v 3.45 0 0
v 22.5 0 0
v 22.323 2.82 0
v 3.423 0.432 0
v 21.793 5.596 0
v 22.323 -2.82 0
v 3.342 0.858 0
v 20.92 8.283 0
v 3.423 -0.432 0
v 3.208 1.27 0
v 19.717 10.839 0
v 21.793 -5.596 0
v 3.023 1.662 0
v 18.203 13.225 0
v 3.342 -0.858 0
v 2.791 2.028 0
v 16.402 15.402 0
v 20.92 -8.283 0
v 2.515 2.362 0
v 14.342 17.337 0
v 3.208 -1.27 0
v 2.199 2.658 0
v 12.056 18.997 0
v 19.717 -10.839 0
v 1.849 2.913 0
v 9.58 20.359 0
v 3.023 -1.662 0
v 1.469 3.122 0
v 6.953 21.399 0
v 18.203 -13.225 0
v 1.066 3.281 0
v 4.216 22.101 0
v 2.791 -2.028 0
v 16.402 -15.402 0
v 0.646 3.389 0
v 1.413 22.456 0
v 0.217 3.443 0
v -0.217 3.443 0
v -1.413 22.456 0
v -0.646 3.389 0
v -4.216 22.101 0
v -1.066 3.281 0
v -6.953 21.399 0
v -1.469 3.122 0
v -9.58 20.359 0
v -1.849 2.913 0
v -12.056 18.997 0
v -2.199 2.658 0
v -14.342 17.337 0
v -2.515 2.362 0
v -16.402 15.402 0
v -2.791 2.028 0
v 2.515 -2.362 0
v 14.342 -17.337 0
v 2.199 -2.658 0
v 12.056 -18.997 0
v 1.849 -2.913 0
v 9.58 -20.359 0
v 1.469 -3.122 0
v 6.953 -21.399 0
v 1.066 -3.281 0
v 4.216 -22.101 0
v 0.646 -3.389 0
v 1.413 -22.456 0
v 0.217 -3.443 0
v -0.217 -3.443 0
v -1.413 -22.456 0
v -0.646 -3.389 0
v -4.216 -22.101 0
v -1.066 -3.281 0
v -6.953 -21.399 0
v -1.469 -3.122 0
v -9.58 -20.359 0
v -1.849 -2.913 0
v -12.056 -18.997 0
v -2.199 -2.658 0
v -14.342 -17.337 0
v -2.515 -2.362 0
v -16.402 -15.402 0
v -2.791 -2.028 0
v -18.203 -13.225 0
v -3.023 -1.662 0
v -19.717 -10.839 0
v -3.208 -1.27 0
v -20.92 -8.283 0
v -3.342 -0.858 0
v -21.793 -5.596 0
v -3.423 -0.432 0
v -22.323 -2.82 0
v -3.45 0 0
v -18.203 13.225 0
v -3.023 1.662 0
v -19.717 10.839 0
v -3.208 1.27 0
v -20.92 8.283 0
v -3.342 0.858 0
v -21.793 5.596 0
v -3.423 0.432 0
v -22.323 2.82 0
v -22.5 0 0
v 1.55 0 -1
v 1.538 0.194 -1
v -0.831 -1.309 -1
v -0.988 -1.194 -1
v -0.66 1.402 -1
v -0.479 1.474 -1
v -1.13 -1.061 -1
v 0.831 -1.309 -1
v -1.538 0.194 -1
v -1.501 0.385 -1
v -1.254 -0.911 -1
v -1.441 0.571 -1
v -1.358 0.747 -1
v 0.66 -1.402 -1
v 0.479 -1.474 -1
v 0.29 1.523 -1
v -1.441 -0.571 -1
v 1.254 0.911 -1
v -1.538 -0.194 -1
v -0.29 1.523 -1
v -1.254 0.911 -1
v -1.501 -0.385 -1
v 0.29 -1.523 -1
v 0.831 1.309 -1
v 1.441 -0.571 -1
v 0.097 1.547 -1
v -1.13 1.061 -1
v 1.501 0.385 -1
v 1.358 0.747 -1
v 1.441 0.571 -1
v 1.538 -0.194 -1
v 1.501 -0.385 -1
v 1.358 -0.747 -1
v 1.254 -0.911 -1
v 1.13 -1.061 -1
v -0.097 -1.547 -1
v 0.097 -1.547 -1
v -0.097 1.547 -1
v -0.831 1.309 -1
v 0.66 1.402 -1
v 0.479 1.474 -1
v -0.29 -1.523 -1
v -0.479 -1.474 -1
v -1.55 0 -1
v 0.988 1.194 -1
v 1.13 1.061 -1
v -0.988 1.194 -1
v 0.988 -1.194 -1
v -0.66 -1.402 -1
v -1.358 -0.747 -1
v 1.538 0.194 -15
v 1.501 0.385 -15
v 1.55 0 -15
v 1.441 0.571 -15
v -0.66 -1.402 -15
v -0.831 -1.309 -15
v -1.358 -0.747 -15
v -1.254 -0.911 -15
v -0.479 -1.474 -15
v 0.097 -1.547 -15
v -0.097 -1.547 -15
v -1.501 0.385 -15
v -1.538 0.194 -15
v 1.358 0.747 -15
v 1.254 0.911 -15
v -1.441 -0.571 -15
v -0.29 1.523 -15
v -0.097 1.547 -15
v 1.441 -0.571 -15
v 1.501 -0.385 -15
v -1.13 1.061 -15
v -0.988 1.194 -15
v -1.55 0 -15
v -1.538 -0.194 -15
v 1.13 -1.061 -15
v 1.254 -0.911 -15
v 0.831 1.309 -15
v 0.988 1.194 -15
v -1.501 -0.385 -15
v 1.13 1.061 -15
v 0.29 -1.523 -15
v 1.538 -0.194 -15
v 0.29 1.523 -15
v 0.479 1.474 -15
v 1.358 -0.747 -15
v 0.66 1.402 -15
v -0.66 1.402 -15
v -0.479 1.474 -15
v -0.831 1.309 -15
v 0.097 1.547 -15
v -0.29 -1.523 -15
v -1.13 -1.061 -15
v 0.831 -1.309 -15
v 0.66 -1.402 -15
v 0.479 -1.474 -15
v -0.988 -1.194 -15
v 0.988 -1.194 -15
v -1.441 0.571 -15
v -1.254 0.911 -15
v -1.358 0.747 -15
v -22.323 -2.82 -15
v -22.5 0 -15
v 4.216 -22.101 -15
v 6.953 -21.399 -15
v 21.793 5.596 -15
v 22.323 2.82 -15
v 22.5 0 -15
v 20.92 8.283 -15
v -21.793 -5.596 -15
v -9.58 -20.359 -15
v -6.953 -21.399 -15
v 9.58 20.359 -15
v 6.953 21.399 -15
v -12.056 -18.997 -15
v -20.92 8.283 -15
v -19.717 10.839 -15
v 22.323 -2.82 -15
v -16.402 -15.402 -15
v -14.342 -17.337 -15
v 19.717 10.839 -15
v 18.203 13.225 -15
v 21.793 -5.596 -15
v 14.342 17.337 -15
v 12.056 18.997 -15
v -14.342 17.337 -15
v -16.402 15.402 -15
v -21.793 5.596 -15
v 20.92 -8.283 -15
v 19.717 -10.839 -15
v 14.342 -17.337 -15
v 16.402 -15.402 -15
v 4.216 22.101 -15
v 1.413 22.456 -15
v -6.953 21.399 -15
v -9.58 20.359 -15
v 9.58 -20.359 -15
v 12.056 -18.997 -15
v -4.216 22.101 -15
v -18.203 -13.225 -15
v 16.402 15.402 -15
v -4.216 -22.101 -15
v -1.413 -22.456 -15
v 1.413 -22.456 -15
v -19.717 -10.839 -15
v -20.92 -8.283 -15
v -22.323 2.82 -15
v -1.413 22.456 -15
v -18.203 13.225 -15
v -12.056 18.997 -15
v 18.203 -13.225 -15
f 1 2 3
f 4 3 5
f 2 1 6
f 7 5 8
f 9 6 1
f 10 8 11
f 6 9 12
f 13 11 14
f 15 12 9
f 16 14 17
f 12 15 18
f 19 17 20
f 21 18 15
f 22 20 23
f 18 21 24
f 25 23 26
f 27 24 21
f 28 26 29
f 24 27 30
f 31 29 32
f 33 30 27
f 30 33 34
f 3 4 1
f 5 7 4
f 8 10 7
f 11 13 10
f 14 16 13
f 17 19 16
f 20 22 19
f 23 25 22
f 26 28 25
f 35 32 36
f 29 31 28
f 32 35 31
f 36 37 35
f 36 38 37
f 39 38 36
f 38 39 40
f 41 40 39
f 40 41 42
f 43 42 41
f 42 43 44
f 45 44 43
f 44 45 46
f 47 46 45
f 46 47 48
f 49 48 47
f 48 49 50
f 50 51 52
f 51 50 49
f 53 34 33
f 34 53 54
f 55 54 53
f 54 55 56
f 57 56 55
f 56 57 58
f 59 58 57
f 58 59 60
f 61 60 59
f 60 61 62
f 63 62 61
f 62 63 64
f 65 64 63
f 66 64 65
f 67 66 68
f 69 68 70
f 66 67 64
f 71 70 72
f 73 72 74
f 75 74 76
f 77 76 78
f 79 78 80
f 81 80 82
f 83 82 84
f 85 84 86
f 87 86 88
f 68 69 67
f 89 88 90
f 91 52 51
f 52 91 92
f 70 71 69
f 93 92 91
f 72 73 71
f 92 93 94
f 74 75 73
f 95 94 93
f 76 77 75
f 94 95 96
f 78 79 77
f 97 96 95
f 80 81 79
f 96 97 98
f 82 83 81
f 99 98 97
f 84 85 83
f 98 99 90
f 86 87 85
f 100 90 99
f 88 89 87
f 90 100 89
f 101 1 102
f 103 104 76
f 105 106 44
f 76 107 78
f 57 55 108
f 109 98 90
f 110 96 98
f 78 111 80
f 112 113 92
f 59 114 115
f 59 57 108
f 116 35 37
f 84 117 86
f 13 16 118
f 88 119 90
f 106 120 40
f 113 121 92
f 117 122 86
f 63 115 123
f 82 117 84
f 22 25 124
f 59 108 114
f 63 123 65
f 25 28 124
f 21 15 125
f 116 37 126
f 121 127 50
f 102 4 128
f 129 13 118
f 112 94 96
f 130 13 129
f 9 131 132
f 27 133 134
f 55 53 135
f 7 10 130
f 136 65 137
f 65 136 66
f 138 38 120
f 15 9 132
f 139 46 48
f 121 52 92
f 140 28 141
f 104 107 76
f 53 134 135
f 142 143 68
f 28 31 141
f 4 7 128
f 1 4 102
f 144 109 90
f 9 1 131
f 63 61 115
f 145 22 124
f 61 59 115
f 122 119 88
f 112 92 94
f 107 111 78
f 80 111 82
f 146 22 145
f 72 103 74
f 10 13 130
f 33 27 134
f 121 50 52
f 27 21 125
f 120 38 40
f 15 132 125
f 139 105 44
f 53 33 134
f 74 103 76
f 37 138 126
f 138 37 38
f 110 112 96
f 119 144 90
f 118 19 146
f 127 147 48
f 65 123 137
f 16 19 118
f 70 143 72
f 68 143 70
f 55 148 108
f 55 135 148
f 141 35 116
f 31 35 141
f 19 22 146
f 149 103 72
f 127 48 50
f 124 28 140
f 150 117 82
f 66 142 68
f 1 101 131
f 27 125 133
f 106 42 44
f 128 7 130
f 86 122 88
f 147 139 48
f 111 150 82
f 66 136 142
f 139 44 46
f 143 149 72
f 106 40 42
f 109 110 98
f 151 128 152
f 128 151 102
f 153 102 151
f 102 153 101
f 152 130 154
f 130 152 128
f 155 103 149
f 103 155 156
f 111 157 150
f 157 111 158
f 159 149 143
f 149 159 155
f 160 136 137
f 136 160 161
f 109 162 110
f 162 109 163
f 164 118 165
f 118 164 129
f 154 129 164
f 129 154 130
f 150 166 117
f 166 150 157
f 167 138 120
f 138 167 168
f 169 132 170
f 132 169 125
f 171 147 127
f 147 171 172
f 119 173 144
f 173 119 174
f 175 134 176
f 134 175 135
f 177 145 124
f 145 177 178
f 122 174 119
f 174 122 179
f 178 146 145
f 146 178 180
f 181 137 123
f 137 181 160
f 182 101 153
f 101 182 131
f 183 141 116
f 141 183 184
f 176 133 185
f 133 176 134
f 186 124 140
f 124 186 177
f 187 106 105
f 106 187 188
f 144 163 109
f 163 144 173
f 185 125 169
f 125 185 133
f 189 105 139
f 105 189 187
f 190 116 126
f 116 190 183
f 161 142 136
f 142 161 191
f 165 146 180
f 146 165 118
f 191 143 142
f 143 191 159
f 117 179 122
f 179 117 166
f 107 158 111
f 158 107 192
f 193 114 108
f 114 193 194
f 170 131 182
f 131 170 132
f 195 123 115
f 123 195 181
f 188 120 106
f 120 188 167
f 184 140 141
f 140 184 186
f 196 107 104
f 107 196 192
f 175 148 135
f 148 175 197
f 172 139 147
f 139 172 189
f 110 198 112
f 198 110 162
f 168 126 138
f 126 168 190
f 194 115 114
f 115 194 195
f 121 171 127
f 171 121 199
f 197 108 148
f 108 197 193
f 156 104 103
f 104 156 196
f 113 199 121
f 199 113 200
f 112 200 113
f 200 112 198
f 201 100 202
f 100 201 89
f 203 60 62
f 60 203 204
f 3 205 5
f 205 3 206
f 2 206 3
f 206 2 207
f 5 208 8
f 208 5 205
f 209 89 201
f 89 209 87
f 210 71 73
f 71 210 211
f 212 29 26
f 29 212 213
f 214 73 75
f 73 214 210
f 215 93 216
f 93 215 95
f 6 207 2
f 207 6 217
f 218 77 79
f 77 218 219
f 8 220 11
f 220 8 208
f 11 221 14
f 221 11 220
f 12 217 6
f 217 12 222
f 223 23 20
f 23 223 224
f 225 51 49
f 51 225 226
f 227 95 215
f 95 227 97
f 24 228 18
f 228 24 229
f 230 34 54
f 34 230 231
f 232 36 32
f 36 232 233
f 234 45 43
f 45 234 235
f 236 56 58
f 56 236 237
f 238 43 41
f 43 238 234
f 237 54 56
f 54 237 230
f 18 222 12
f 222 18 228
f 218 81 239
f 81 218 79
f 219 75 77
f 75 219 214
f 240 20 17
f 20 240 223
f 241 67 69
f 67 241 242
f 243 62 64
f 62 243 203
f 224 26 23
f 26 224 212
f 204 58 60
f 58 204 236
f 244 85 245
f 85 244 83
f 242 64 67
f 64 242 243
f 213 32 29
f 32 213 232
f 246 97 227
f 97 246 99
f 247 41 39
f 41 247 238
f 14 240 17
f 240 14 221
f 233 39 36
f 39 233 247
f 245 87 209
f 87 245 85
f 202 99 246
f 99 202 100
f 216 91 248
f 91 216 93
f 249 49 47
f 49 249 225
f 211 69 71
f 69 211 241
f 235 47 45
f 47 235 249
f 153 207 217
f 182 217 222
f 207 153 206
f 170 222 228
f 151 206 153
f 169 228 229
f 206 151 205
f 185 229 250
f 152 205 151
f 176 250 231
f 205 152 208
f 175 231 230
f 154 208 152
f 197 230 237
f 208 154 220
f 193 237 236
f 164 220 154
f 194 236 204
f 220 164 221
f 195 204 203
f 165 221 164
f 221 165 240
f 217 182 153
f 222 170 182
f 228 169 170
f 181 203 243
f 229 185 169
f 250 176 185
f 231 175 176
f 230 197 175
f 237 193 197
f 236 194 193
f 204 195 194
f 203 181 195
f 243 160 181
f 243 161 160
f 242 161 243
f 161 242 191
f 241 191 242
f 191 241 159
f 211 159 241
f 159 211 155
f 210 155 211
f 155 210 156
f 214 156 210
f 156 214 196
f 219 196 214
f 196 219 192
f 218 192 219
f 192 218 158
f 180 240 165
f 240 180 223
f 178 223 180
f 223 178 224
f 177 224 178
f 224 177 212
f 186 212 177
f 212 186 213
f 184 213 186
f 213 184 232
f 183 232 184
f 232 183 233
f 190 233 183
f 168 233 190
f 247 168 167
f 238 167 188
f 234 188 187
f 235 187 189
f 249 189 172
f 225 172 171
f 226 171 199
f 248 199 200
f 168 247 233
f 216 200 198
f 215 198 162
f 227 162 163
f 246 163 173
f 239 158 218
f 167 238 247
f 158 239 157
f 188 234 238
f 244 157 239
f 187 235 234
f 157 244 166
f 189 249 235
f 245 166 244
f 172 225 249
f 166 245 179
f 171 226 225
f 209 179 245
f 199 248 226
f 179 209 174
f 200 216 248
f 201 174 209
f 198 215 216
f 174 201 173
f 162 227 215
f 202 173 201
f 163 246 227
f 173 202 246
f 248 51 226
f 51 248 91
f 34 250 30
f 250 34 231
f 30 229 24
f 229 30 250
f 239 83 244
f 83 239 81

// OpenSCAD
$fn = 50;

difference() {
	union() {
		translate(v = [0, 0, -15.0]) {
			cylinder(h = 15, r = 22.5);
		}
	}
	union() {
		translate(v = [0, 0, 0]) {
			rotate(a = [0, 0, 0]) {
				difference() {
					union() {
						translate(v = [0, 0, -18.0]) {
							cylinder(h = 18, r = 1.25);
						}
						translate(v = [0, 0, -1.0]) {
							cylinder(h = 1.0, r1 = 1.55, r2 = 3.45);
						}
						translate(v = [0, 0, -18.0]) {
							cylinder(h = 18, r = 1.55);
						}
						translate(v = [0, 0, -18.0]) {
							cylinder(h = 18, r = 1.25);
						}
					}
					union();
				}
			}
		}
	}
}
